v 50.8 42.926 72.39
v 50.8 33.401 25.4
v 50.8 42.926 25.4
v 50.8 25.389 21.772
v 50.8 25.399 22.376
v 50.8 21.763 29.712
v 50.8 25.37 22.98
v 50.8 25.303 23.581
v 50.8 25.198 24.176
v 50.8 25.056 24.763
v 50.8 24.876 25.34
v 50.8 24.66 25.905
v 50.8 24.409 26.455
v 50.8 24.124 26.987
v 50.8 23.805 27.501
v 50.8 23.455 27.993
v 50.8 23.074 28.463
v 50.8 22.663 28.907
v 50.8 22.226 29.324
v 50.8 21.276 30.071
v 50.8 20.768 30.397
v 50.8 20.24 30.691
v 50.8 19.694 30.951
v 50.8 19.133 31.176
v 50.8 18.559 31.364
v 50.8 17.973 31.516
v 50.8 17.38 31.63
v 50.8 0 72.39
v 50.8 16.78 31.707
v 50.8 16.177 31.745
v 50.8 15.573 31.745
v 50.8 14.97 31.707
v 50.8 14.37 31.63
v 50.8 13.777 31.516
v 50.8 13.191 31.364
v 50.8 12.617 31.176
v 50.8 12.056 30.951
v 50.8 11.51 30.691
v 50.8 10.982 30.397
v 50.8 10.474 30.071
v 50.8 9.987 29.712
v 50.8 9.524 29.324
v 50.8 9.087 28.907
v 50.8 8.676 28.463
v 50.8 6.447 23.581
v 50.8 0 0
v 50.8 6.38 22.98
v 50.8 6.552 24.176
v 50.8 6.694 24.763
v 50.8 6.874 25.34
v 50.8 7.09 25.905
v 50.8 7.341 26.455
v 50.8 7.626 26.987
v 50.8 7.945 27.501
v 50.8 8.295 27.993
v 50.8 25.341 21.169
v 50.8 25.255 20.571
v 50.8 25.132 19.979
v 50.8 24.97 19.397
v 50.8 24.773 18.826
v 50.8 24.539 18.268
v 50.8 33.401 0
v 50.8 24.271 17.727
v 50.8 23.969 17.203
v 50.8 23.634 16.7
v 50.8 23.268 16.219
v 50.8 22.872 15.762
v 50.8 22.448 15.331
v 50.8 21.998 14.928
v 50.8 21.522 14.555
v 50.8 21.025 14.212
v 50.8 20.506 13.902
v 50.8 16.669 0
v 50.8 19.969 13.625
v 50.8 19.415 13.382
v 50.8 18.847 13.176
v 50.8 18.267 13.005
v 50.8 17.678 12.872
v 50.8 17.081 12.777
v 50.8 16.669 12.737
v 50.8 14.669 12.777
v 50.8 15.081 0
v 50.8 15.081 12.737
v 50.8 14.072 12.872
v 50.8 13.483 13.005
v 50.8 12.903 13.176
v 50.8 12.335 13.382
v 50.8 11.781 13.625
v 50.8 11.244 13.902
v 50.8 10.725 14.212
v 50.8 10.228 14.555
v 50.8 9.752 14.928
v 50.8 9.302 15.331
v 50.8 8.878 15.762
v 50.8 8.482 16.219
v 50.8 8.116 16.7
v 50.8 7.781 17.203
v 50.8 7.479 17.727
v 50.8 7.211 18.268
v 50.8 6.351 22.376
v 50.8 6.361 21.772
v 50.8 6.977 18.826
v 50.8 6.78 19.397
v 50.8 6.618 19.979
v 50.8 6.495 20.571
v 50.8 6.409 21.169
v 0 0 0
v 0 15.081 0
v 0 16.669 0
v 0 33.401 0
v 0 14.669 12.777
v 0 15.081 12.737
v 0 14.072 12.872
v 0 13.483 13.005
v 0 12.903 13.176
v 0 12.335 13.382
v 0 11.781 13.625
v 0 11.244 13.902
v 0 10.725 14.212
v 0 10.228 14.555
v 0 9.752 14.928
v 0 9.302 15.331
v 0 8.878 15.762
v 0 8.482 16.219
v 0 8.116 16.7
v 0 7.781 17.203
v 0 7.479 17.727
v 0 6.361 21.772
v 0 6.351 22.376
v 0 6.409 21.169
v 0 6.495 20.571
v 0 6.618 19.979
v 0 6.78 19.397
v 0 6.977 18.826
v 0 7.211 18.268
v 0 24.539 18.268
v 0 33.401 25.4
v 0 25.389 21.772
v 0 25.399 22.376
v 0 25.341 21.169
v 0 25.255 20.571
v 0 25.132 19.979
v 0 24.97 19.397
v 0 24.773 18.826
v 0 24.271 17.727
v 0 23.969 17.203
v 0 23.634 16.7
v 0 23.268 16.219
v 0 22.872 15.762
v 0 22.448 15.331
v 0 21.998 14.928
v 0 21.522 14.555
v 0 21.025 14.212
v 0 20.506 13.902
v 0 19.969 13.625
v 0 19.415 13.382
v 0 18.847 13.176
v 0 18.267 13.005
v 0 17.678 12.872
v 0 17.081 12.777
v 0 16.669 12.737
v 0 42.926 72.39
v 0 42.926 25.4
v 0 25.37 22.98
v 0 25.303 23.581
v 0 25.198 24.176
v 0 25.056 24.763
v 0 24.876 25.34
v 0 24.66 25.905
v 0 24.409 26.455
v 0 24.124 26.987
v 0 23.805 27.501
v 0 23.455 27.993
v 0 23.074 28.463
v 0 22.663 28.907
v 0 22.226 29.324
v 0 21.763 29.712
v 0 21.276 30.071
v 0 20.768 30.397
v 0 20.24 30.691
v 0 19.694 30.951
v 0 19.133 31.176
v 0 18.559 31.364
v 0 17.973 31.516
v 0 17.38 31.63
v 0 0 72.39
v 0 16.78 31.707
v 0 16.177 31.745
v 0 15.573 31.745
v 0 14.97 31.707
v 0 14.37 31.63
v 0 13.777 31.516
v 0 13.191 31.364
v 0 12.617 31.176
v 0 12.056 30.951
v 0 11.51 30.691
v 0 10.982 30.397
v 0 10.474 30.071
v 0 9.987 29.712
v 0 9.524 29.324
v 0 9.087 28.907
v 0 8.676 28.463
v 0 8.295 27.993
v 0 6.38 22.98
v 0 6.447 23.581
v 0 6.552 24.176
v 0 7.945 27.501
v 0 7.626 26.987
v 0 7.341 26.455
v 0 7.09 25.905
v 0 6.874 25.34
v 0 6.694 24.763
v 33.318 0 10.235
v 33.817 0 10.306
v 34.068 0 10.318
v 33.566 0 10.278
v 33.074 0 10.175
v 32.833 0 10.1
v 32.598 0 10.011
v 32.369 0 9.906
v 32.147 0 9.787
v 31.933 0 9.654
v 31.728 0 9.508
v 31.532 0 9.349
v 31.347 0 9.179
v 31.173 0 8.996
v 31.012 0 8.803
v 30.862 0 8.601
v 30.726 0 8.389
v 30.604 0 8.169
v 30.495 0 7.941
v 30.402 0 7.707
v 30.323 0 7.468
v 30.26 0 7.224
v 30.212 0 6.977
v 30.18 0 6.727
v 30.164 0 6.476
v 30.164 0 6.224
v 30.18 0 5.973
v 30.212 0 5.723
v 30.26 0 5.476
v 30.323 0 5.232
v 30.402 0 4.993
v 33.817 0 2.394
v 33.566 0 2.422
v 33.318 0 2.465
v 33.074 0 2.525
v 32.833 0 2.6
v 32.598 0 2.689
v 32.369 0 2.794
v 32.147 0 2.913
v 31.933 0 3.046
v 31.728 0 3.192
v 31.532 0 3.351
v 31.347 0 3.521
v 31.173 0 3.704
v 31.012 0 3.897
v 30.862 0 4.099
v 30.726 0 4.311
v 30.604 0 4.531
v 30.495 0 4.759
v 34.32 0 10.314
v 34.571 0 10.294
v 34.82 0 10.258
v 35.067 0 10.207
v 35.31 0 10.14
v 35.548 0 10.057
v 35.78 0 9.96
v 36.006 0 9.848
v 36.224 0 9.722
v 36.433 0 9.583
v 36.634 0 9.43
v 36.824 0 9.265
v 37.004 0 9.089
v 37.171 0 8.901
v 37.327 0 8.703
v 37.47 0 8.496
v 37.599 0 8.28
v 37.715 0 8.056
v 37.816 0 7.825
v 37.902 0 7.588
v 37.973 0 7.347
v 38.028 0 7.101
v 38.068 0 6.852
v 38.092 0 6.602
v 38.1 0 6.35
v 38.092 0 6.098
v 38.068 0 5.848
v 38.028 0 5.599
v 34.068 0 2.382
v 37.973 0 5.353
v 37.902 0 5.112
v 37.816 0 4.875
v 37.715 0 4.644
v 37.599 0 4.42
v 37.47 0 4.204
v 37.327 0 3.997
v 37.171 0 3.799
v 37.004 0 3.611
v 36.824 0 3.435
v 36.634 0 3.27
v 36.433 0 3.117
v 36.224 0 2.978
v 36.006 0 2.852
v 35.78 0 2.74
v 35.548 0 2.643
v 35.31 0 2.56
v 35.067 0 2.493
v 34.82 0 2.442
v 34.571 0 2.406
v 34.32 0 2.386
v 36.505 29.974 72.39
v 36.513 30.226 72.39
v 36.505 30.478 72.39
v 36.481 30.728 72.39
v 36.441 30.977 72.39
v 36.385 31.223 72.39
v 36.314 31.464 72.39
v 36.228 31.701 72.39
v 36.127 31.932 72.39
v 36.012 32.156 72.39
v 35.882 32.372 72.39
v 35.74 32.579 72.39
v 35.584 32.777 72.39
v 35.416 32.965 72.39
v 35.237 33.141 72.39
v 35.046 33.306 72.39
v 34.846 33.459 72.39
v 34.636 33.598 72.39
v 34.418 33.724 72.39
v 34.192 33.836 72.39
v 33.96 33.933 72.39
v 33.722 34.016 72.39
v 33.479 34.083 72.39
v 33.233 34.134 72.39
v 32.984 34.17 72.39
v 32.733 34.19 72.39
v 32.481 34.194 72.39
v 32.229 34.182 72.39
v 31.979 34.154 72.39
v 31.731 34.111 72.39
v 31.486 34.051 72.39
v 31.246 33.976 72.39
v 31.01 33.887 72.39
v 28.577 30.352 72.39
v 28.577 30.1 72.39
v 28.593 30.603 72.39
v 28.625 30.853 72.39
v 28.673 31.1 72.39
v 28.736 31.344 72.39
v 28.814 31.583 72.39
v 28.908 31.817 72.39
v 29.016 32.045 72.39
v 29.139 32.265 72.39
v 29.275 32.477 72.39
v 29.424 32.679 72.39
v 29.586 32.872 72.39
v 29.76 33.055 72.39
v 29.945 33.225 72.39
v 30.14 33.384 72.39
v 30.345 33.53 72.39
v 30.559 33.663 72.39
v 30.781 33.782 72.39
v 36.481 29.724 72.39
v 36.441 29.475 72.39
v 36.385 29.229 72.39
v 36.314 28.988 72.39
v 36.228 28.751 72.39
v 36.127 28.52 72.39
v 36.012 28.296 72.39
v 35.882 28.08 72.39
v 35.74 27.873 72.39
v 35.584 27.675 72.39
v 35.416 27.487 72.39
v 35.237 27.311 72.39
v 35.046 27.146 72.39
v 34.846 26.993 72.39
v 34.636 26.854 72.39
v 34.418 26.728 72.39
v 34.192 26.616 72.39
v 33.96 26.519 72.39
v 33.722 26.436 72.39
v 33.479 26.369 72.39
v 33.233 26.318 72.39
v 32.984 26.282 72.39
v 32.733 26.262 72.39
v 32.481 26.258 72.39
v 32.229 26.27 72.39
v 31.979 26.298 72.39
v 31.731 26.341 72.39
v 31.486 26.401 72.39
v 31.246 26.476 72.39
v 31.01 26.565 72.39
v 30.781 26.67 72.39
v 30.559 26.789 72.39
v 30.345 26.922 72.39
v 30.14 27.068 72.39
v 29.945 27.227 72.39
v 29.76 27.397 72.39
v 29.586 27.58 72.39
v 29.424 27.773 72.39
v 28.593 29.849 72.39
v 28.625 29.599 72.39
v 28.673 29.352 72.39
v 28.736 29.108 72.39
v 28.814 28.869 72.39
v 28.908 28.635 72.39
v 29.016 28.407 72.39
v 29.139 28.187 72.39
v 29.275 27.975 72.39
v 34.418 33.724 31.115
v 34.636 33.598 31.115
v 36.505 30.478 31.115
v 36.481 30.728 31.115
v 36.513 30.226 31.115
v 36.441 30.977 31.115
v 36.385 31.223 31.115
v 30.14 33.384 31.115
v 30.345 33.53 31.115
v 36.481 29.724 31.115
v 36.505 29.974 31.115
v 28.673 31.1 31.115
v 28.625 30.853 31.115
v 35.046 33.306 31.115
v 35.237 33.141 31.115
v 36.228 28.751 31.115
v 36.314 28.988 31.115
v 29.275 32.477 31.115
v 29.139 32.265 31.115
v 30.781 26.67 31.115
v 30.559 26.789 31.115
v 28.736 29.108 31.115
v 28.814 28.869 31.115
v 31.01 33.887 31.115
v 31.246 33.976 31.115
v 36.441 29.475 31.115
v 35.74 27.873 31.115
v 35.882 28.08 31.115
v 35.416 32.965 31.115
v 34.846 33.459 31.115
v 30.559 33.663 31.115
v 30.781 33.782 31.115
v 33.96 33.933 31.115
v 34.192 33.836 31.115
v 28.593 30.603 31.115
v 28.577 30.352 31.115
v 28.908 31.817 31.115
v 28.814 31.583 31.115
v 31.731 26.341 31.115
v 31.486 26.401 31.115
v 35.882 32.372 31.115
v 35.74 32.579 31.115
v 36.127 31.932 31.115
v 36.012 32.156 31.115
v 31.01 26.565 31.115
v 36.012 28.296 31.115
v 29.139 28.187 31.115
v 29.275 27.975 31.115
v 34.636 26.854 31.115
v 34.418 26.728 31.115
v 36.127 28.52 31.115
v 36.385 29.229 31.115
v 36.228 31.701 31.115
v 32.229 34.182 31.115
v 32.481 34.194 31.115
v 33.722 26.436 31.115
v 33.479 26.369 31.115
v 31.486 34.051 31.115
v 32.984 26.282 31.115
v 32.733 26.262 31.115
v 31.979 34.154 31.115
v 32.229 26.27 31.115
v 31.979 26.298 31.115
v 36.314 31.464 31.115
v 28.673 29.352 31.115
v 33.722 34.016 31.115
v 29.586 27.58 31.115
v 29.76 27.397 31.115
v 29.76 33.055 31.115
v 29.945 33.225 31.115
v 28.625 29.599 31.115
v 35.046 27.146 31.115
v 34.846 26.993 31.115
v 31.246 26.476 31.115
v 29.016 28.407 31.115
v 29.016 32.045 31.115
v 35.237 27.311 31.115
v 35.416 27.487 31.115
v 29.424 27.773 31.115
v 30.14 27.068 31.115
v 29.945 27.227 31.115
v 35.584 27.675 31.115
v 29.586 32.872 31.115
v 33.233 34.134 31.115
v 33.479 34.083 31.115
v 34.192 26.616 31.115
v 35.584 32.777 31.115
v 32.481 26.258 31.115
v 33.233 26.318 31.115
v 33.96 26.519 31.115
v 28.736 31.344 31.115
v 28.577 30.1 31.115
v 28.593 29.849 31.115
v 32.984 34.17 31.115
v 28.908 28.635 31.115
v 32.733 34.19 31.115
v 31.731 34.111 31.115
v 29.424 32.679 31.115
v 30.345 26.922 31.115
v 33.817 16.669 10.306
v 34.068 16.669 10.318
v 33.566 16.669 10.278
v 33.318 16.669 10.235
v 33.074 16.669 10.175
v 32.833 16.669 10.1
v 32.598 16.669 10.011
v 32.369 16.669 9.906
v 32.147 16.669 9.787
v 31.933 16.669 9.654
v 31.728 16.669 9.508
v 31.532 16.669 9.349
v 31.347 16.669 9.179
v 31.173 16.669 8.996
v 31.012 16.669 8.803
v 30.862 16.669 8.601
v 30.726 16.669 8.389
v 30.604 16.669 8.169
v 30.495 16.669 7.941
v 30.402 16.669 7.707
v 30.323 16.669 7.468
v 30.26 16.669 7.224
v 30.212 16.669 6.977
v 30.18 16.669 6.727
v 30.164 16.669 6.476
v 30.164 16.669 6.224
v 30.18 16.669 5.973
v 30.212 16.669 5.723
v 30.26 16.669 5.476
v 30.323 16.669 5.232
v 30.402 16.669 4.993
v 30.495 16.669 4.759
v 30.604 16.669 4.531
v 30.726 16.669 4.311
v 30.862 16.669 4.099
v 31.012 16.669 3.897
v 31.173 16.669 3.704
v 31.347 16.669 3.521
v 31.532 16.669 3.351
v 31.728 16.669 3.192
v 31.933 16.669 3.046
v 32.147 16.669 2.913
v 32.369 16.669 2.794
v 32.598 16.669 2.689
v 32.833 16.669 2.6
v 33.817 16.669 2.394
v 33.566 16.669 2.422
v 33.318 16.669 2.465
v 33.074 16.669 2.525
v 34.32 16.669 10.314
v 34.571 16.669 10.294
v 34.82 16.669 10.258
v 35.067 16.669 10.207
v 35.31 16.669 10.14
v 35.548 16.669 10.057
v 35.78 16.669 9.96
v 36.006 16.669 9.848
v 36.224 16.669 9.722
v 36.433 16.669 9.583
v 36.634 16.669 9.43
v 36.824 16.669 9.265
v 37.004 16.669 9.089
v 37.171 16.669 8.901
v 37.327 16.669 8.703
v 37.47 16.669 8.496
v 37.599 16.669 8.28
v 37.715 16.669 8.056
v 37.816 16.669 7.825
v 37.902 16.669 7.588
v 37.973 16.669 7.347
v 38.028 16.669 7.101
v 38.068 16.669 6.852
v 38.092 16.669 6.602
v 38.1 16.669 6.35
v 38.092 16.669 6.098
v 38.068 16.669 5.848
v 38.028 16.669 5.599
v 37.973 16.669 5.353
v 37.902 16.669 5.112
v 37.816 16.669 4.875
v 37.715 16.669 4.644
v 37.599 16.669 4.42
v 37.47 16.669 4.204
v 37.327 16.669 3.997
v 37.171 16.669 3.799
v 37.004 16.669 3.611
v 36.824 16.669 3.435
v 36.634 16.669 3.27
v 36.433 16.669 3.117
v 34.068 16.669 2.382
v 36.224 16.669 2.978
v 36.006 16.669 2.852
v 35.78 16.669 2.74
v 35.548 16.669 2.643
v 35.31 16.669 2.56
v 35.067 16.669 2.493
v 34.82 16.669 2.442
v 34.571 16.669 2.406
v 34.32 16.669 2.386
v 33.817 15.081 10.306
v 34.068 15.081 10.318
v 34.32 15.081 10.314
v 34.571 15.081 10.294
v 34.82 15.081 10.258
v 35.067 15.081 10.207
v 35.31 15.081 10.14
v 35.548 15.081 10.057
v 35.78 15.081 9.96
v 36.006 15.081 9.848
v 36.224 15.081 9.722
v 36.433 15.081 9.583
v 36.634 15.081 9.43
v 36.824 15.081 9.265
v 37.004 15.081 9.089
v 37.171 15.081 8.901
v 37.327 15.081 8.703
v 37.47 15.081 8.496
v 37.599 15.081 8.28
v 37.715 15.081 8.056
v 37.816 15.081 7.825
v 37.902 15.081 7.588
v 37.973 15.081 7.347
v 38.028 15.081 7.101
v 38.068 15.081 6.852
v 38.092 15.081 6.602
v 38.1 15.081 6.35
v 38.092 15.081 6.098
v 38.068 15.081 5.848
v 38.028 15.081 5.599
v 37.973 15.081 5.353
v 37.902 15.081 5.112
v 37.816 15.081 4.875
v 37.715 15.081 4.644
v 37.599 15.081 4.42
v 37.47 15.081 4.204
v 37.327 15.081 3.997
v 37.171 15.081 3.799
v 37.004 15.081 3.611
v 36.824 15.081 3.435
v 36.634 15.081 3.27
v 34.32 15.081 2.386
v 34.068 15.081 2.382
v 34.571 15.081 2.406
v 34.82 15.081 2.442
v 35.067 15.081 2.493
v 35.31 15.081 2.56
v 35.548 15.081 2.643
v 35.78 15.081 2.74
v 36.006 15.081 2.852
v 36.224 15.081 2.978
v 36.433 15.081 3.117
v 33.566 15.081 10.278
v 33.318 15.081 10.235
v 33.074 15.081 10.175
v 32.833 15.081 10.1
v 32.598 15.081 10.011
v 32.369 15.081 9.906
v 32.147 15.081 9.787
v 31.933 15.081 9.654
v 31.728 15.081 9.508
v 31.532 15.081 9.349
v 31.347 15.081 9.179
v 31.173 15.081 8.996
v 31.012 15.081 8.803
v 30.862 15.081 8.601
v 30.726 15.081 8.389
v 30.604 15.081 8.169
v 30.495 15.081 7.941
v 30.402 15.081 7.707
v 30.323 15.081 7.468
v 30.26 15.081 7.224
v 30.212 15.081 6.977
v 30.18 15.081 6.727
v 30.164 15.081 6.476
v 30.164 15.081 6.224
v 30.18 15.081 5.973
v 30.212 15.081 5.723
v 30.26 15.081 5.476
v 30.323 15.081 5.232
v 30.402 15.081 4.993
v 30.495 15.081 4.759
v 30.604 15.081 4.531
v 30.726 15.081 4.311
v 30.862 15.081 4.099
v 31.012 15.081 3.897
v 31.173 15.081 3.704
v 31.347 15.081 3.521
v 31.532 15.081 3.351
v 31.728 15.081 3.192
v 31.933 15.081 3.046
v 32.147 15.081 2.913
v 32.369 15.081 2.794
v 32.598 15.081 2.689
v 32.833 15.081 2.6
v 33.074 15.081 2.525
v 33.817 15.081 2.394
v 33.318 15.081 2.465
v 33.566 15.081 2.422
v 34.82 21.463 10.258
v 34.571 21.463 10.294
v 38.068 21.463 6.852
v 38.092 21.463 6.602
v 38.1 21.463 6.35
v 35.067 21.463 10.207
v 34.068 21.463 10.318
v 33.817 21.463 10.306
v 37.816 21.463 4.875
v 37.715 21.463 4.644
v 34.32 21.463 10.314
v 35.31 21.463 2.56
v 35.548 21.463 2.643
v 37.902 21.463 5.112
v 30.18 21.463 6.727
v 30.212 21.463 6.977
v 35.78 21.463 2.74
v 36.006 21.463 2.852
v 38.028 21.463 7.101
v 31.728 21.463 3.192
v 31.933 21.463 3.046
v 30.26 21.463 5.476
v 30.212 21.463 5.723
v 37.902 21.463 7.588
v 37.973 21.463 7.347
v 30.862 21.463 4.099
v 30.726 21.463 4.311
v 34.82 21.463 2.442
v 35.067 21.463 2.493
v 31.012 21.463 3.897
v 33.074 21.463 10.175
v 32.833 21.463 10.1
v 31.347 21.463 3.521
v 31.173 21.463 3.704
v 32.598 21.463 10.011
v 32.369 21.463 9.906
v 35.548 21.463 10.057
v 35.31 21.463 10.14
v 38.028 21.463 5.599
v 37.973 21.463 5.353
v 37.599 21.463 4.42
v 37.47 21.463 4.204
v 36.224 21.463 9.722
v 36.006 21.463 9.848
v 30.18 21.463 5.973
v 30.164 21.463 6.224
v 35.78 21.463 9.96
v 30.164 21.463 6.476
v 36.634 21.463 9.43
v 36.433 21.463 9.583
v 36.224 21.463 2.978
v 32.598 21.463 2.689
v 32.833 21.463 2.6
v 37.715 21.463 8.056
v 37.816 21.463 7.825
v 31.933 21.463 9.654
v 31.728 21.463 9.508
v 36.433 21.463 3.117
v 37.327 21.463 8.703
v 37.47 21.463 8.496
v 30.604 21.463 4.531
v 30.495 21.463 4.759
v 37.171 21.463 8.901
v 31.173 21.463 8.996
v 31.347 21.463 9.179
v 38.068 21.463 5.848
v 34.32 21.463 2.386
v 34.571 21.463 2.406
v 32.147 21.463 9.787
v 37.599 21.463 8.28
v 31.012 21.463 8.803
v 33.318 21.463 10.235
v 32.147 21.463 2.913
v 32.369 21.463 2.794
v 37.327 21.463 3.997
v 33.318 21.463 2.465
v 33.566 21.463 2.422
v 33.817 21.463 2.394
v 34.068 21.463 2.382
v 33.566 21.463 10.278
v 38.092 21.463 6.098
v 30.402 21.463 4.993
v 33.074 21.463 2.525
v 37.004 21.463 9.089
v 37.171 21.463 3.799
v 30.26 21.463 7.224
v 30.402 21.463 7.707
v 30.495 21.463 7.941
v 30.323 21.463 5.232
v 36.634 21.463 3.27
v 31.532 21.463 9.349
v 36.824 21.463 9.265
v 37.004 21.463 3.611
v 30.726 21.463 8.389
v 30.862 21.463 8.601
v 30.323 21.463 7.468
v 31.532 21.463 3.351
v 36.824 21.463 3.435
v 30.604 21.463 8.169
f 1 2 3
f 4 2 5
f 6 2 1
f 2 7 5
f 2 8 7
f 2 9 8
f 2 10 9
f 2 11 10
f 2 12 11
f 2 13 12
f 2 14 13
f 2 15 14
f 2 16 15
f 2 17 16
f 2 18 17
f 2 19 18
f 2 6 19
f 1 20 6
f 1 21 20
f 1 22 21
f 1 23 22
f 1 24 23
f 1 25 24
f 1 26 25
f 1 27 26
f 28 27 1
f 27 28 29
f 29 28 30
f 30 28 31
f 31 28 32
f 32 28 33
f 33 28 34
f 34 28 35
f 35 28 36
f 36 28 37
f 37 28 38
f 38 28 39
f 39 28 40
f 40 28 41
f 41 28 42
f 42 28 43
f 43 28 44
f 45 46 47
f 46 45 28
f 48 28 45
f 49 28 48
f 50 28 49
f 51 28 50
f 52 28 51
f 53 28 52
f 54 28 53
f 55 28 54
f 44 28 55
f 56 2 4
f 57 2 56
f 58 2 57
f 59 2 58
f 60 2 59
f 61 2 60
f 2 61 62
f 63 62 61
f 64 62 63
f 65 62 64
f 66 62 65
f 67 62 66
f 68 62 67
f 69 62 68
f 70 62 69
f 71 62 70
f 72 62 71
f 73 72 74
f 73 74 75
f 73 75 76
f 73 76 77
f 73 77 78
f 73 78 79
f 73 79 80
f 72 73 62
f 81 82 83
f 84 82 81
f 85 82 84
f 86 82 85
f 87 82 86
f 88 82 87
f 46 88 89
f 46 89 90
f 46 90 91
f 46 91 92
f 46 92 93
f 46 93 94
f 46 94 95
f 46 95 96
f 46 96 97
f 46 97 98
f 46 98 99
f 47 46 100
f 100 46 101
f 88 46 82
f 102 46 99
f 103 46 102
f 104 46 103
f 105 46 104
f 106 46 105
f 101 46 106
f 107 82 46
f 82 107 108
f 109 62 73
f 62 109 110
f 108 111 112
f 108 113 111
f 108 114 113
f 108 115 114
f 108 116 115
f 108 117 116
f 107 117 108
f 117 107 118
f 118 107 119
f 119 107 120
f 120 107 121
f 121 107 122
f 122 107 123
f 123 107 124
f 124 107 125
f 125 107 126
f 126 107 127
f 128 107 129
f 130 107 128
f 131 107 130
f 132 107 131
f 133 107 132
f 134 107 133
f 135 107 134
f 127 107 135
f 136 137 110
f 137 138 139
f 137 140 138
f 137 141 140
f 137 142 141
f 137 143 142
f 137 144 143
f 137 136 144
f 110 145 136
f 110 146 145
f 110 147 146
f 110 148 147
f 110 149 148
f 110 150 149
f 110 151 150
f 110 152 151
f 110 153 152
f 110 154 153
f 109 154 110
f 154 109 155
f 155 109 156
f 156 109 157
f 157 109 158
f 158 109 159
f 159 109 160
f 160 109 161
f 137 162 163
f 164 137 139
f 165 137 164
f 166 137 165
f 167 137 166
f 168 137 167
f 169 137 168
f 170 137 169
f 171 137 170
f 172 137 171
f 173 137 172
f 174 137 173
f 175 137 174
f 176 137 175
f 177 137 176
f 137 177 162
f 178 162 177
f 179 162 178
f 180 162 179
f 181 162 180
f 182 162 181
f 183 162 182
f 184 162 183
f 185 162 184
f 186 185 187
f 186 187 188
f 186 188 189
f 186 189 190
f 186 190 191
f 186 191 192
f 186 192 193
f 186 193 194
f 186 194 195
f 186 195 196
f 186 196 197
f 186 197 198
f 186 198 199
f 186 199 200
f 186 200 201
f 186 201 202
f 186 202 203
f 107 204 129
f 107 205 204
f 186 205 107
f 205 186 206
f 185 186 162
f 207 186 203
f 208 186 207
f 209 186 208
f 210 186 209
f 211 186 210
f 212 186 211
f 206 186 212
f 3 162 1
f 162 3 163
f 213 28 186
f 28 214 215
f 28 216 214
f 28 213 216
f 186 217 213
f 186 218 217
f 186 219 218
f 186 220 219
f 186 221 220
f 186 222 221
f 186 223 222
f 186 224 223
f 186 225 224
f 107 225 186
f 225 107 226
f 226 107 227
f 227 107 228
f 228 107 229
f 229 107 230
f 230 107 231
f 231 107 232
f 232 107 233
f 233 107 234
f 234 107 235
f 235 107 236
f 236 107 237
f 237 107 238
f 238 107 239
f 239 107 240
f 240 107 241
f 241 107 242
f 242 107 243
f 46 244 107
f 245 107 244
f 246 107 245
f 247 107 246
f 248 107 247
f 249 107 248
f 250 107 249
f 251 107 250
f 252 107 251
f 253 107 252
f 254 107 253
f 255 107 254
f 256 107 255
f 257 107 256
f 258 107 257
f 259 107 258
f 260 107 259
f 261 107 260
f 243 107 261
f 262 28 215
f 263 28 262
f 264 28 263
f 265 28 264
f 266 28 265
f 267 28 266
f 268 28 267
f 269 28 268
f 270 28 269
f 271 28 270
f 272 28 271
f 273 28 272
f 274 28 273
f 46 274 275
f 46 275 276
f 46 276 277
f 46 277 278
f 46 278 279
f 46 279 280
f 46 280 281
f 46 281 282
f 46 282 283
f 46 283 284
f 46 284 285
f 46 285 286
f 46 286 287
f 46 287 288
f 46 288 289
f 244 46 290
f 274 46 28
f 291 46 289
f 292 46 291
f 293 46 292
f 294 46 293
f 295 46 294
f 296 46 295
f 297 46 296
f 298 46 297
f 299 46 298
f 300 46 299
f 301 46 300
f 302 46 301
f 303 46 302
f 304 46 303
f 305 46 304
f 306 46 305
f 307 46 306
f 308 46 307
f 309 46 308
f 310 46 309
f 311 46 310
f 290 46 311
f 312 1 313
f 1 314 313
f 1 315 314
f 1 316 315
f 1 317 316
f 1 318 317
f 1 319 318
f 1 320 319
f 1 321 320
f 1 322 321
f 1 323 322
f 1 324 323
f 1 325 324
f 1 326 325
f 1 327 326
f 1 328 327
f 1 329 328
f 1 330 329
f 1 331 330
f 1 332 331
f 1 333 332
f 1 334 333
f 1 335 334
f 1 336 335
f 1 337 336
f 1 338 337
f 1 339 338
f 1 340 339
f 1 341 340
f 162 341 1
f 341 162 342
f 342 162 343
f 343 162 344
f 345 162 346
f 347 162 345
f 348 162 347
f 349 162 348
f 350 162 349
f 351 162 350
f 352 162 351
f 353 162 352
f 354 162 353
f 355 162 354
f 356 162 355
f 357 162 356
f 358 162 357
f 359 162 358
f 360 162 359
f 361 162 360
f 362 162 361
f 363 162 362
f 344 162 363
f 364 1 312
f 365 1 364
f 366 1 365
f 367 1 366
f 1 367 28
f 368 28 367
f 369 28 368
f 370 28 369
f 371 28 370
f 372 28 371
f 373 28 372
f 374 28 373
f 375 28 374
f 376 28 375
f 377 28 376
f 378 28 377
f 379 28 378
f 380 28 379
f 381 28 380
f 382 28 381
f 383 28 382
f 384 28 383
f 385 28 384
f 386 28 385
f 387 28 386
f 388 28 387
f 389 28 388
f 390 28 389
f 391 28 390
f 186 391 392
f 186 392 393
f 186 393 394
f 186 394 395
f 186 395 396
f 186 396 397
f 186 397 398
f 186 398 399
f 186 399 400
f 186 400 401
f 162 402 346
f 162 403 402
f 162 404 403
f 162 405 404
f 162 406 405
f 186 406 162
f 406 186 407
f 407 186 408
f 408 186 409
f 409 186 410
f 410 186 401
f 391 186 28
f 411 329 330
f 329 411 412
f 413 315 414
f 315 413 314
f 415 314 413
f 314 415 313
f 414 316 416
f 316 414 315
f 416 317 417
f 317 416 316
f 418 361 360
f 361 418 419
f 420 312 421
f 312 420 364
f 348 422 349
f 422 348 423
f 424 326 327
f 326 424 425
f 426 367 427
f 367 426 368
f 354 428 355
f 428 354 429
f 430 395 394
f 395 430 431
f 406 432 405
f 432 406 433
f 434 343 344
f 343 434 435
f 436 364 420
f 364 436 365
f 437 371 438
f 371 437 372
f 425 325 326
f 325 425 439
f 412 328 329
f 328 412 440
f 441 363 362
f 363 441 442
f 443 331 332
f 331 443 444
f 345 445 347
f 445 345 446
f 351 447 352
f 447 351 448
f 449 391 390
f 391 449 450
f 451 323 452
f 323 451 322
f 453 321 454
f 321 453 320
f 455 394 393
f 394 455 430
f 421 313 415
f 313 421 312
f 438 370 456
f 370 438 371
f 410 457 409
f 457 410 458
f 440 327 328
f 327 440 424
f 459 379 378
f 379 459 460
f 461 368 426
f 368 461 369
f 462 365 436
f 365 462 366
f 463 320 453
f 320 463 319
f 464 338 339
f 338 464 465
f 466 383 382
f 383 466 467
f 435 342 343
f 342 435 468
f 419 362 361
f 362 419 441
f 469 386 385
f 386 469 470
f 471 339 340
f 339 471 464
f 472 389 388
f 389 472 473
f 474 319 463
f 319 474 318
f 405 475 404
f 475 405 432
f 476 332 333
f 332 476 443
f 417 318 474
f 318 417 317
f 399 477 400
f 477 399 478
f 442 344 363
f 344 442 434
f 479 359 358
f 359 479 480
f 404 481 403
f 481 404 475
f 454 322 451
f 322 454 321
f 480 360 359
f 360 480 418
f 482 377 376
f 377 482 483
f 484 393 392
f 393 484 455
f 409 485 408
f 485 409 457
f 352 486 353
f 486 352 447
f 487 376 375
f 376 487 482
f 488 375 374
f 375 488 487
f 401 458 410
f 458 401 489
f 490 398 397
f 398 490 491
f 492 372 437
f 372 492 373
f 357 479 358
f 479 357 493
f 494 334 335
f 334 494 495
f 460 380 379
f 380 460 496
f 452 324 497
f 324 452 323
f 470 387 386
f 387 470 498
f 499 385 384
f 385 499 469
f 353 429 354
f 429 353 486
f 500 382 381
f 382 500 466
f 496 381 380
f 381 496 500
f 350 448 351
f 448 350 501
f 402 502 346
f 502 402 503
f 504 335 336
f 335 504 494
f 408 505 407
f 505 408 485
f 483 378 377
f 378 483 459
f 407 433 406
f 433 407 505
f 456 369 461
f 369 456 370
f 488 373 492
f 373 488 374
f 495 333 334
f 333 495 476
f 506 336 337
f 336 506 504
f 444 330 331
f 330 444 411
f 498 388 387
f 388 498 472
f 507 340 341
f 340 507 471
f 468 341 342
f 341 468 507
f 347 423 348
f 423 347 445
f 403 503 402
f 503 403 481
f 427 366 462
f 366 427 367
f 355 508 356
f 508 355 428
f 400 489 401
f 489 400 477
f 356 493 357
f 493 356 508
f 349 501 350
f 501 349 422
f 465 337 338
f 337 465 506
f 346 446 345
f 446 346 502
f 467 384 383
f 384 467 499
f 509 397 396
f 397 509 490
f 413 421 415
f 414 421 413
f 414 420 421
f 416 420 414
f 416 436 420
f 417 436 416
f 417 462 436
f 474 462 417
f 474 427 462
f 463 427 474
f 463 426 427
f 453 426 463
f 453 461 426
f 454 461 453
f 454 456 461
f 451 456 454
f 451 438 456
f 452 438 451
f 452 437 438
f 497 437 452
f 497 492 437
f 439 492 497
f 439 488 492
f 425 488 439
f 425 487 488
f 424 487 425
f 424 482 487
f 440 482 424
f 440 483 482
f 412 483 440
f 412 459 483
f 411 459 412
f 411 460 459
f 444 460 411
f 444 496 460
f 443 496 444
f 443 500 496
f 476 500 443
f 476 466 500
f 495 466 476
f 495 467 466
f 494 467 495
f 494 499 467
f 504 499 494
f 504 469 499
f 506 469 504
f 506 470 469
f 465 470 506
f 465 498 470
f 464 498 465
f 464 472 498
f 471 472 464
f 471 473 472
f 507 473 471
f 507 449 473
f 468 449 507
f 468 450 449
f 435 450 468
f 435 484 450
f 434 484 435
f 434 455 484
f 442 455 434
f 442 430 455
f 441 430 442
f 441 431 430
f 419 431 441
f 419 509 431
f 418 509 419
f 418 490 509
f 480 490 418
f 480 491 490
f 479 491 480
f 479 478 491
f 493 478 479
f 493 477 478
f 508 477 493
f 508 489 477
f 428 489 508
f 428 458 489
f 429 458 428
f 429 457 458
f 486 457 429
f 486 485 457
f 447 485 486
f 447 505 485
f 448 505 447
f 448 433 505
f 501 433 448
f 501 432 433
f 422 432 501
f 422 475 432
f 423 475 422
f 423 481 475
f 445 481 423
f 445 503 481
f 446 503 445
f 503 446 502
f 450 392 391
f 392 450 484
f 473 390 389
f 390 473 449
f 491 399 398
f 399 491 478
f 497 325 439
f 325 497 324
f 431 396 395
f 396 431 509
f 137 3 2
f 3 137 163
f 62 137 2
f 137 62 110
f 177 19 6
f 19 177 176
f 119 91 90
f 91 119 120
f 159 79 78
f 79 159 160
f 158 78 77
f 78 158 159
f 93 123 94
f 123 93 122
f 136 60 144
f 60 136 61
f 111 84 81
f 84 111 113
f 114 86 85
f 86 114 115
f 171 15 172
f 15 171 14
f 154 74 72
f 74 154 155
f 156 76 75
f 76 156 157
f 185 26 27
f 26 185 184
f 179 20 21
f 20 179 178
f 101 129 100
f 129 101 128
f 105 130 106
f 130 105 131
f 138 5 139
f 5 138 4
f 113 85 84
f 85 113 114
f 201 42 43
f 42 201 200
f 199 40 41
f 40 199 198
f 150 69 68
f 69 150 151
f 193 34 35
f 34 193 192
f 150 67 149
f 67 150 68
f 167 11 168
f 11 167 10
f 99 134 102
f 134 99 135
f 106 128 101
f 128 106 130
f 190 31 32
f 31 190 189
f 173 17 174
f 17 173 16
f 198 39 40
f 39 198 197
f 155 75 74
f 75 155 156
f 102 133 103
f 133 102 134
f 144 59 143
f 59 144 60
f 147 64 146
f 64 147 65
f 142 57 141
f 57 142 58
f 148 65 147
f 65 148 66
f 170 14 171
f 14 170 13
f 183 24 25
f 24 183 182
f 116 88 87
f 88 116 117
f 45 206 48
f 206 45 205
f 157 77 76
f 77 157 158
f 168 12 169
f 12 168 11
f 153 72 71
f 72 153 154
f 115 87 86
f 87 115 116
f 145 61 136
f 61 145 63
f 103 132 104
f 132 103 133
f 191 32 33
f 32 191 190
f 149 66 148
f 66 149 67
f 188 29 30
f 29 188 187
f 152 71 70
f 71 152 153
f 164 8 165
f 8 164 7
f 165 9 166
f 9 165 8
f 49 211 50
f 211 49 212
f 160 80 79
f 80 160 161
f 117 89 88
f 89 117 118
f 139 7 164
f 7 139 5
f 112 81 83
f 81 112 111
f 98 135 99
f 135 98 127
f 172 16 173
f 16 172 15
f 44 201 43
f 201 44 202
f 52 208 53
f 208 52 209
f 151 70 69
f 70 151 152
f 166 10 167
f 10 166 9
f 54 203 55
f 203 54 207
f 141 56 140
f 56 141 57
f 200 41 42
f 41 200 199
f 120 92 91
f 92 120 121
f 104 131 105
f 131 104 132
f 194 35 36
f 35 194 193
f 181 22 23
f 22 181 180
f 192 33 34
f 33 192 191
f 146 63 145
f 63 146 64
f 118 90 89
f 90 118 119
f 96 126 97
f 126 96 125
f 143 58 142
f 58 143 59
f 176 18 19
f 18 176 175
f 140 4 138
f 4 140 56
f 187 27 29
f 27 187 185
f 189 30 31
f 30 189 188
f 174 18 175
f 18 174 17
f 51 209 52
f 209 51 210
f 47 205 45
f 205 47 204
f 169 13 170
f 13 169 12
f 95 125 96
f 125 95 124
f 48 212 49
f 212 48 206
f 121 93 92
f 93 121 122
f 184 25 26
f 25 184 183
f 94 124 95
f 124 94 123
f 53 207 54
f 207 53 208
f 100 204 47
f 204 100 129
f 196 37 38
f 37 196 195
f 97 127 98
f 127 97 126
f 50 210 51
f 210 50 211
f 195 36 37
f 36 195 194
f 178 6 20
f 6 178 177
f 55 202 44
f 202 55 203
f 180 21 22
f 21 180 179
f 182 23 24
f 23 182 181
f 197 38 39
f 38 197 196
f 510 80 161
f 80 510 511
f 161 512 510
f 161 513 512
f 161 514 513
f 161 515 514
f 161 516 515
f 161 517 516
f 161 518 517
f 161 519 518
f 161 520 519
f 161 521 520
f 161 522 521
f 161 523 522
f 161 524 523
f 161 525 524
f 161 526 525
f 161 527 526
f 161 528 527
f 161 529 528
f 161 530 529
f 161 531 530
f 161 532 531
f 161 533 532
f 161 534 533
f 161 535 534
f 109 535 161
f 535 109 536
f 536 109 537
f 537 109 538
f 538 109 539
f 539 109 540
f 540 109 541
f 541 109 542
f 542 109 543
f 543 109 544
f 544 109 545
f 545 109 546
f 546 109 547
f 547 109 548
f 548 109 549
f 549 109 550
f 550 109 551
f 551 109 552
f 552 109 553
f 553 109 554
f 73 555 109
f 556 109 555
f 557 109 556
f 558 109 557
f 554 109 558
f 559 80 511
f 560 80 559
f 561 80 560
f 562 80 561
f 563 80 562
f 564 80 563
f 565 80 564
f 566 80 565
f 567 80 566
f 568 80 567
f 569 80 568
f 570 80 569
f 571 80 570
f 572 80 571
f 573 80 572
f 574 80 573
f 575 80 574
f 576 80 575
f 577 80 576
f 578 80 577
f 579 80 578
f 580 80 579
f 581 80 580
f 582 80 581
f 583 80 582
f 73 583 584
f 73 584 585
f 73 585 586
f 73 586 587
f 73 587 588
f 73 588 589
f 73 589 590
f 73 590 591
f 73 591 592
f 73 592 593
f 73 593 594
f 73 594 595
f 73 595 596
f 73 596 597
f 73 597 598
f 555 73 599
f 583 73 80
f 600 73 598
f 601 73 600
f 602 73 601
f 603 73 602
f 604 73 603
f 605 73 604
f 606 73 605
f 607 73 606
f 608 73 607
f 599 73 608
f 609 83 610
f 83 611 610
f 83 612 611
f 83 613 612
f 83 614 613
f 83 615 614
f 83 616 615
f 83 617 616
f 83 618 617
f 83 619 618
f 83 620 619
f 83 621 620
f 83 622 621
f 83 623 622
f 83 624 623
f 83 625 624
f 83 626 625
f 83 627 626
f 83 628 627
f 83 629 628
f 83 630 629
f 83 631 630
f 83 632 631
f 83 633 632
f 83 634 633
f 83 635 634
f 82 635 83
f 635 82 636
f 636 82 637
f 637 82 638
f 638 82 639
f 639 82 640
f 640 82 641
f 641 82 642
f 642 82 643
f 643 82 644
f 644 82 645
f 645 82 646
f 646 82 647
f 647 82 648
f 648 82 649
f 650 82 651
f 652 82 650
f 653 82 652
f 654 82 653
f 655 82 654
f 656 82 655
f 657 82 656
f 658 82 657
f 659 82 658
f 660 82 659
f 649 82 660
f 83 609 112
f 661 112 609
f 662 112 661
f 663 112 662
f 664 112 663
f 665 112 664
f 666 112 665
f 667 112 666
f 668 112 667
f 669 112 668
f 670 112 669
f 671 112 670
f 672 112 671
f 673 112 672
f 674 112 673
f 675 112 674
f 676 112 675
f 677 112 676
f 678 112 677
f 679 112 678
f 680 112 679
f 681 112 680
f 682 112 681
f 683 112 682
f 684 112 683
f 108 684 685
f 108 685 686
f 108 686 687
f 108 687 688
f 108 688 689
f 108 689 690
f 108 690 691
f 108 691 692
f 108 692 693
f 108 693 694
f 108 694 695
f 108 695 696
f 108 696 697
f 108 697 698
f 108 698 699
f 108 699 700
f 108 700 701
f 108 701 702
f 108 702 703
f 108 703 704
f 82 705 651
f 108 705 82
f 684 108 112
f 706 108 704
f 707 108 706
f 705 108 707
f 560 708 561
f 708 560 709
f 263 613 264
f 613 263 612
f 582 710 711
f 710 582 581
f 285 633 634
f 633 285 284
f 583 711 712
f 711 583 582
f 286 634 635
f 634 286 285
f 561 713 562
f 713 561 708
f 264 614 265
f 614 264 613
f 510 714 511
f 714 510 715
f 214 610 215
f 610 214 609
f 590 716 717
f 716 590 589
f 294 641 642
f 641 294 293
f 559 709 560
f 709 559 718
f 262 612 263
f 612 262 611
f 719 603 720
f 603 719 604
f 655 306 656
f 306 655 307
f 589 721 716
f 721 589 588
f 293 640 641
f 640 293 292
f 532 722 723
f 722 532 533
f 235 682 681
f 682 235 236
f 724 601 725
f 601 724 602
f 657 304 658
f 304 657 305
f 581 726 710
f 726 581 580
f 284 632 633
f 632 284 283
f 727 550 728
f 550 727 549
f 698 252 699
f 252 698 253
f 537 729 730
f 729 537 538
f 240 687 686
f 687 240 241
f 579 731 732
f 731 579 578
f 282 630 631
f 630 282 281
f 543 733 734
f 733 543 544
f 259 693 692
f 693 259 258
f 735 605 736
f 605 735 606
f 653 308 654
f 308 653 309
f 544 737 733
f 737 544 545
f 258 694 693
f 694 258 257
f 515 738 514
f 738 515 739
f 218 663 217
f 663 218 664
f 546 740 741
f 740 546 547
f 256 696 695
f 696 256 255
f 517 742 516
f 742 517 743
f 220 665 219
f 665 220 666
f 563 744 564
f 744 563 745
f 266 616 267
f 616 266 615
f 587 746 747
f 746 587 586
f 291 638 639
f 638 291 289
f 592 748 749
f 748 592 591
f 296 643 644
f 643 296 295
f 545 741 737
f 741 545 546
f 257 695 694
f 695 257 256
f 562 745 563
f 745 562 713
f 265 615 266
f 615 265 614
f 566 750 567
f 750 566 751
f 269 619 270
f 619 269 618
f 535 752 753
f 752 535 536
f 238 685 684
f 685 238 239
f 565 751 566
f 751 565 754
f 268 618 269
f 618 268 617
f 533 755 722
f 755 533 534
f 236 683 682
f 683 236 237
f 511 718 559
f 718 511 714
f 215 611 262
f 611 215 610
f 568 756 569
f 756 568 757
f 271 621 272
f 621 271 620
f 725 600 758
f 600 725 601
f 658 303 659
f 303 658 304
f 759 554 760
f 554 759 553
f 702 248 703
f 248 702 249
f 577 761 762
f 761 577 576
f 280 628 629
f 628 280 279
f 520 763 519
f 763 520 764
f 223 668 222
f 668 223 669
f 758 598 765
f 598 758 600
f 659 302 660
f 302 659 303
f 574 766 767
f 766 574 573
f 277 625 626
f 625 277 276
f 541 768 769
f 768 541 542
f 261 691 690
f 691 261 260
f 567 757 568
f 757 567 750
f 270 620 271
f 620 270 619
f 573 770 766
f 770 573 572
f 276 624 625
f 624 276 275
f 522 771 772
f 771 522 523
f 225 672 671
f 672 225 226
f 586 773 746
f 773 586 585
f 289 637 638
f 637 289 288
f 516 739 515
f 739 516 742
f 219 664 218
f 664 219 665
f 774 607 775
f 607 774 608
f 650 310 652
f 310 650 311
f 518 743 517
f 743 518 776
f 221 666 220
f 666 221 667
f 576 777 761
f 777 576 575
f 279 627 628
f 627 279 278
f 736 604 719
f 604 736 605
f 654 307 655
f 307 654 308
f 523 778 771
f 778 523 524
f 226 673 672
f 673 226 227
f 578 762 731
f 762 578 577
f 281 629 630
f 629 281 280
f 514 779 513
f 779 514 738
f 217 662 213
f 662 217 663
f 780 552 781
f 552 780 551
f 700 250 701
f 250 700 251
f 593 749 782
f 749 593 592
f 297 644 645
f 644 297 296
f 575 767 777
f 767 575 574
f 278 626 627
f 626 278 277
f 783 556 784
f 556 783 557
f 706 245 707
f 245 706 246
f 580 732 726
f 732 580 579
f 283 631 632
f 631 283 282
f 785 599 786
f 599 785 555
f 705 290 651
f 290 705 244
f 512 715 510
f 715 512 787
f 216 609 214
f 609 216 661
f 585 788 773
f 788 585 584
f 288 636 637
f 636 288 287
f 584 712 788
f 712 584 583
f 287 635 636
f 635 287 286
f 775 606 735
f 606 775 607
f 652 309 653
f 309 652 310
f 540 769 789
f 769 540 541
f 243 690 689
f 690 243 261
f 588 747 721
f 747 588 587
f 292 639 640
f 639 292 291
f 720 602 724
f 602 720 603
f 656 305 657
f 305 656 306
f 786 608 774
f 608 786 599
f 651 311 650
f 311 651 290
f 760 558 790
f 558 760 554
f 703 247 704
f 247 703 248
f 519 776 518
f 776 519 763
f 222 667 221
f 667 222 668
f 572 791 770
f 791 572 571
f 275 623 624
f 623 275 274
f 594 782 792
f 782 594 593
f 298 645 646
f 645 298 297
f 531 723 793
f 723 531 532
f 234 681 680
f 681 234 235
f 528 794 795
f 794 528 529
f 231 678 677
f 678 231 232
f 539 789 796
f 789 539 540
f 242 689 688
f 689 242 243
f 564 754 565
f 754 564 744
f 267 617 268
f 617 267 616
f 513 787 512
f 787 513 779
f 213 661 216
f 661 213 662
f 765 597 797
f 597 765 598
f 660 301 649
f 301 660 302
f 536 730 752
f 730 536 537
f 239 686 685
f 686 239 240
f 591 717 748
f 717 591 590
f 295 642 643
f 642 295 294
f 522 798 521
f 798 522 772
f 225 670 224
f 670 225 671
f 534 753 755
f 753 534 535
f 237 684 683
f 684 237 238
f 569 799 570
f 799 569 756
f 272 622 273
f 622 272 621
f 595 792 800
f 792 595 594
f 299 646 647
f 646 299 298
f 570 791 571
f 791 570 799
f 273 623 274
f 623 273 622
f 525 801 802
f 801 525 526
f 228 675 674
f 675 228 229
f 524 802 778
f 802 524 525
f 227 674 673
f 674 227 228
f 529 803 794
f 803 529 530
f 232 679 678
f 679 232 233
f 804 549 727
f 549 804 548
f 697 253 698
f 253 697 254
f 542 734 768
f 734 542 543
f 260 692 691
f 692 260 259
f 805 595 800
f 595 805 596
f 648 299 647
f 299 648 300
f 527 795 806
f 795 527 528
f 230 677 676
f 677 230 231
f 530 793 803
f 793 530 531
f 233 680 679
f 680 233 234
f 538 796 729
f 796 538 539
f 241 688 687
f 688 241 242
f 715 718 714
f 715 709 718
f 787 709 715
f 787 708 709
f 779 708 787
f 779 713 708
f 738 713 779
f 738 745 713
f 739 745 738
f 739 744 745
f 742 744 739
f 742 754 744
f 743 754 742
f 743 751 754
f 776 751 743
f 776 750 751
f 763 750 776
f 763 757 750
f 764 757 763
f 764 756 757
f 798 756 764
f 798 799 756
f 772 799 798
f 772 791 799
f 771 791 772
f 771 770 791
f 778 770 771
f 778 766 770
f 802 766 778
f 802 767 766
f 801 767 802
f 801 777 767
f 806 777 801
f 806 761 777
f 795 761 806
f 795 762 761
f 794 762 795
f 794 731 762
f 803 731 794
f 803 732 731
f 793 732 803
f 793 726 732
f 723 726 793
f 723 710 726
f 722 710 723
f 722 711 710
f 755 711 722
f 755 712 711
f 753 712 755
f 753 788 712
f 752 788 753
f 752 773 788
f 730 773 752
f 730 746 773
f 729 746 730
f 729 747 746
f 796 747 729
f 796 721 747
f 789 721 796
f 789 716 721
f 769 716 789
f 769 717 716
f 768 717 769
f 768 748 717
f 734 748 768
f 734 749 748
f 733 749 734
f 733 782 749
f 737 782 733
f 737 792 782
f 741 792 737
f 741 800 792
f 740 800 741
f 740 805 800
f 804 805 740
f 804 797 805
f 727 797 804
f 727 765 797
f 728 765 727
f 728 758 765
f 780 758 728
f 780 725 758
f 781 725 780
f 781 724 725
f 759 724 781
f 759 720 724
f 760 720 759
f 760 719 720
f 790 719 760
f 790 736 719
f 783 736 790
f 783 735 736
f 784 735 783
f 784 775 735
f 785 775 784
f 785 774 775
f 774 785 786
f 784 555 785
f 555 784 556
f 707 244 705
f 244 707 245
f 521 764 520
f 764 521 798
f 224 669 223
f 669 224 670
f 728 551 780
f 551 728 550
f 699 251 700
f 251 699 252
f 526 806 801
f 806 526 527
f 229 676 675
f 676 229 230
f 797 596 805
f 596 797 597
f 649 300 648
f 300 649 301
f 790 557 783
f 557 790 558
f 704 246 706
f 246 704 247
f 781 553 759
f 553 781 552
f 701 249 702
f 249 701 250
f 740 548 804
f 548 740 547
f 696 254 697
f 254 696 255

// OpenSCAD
include <MCAD/math.scad>

// angle iron: 1x1x 1/8?
//ss||angle|1/8|1|11-3/4||SL||

// block: 2 x 2.25 x 3.24
//steel||rect|2|2-1/4|3-1/4||BR||cross-brace

inch = mm_per_inch;
half_inch = mm_per_inch * 0.5;
quarter_inch = mm_per_inch * 0.25;
eighth = mm_per_inch * (1.0 / 8);
sixteenth = mm_per_inch * (1.0 / 16);

bar_x = mm_per_inch * 2;
// shorten entire Y side by 0.56
bar_y = mm_per_inch * (2.25 - 0.56);
bar_z = mm_per_inch * 3.25;

ang_thick = mm_per_inch * (1.0 / 8);
ang_side = inch;

rod_dia = mm_per_inch * 0.75;
half_rod = rod_dia / 2;

bolt_dia = mm_per_inch * (5.0 / 16);
half_bolt = bolt_dia / 2;



// top of rod to splitter: 1.5"
// top of rod to center of bolt hole: 2.25"
// bottom of angle bracket to center of bolt hole: 1/2"
// top of rod to base of angle bracket: 1.75"
// offset of angle bracket hole center from end of rod: 1/2" + 25/32"
room_for_rod = rod_dia + half_inch;
lop = inch + half_inch + quarter_inch + room_for_rod -
 (mm_per_inch * 0.15); // printed 0.15 too high
conn_bolt_offset = half_inch + (mm_per_inch * (25.0 / 32));

module bracket() {
    difference() {
        cube([bar_x, bar_y, bar_z]);
        
        // reduce height
        translate([0, 0, lop])
            cube([bar_x, bar_y, bar_z - lop]);
        
        // drill hole for 5/16 bolt
        translate([conn_bolt_offset, bar_y - ang_side / 2, lop])
            cylinder(d=bolt_dia, h=bar_z, center=true, $fn=99);
        
        translate([0, bar_y - quarter_inch - eighth , 0])
            cube([bar_x, half_inch, inch]);
        
        translate([0, quarter_inch + half_rod, half_inch + half_rod])
            rotate([0, 90, 0])
                cylinder(d=rod_dia, h=bar_x, $fn=99);
        
        translate([0, quarter_inch + half_rod - (sixteenth / 2), 0])
                cube([bar_x, sixteenth, half_inch + 1]);
        
        translate([(bar_x - half_inch - half_bolt), 0, quarter_inch])
            rotate([90, 0, 0])
                cylinder(d=bolt_dia, h=bar_y, center=true, $fn=99);
    }
}

module angle_bracket() {
    union() {
        difference() {
            translate([-(ang_side+20), 0, 0])
                cube([ang_side, ang_side, ang_thick]);
            translate([-((ang_side / 2) + 20), ang_side / 2, 0])
                cylinder(d=bolt_dia, h=(ang_thick+1), $fn=99);
        }
        
        difference() {
            translate([-(ang_side+20), ang_side, 0])
                rotate([90, 0, 0])
                    cube([ang_side, ang_side, ang_thick]);
            translate([-((ang_side / 2) + 20), ang_side - 2, ang_side / 2])
                rotate([90, 0, 0])
                    cylinder(d=bolt_dia, h=(ang_thick+2), center=true, $fn=99);
            
        }
    }
}

union() {
    bracket();
    //angle_bracket();
}
